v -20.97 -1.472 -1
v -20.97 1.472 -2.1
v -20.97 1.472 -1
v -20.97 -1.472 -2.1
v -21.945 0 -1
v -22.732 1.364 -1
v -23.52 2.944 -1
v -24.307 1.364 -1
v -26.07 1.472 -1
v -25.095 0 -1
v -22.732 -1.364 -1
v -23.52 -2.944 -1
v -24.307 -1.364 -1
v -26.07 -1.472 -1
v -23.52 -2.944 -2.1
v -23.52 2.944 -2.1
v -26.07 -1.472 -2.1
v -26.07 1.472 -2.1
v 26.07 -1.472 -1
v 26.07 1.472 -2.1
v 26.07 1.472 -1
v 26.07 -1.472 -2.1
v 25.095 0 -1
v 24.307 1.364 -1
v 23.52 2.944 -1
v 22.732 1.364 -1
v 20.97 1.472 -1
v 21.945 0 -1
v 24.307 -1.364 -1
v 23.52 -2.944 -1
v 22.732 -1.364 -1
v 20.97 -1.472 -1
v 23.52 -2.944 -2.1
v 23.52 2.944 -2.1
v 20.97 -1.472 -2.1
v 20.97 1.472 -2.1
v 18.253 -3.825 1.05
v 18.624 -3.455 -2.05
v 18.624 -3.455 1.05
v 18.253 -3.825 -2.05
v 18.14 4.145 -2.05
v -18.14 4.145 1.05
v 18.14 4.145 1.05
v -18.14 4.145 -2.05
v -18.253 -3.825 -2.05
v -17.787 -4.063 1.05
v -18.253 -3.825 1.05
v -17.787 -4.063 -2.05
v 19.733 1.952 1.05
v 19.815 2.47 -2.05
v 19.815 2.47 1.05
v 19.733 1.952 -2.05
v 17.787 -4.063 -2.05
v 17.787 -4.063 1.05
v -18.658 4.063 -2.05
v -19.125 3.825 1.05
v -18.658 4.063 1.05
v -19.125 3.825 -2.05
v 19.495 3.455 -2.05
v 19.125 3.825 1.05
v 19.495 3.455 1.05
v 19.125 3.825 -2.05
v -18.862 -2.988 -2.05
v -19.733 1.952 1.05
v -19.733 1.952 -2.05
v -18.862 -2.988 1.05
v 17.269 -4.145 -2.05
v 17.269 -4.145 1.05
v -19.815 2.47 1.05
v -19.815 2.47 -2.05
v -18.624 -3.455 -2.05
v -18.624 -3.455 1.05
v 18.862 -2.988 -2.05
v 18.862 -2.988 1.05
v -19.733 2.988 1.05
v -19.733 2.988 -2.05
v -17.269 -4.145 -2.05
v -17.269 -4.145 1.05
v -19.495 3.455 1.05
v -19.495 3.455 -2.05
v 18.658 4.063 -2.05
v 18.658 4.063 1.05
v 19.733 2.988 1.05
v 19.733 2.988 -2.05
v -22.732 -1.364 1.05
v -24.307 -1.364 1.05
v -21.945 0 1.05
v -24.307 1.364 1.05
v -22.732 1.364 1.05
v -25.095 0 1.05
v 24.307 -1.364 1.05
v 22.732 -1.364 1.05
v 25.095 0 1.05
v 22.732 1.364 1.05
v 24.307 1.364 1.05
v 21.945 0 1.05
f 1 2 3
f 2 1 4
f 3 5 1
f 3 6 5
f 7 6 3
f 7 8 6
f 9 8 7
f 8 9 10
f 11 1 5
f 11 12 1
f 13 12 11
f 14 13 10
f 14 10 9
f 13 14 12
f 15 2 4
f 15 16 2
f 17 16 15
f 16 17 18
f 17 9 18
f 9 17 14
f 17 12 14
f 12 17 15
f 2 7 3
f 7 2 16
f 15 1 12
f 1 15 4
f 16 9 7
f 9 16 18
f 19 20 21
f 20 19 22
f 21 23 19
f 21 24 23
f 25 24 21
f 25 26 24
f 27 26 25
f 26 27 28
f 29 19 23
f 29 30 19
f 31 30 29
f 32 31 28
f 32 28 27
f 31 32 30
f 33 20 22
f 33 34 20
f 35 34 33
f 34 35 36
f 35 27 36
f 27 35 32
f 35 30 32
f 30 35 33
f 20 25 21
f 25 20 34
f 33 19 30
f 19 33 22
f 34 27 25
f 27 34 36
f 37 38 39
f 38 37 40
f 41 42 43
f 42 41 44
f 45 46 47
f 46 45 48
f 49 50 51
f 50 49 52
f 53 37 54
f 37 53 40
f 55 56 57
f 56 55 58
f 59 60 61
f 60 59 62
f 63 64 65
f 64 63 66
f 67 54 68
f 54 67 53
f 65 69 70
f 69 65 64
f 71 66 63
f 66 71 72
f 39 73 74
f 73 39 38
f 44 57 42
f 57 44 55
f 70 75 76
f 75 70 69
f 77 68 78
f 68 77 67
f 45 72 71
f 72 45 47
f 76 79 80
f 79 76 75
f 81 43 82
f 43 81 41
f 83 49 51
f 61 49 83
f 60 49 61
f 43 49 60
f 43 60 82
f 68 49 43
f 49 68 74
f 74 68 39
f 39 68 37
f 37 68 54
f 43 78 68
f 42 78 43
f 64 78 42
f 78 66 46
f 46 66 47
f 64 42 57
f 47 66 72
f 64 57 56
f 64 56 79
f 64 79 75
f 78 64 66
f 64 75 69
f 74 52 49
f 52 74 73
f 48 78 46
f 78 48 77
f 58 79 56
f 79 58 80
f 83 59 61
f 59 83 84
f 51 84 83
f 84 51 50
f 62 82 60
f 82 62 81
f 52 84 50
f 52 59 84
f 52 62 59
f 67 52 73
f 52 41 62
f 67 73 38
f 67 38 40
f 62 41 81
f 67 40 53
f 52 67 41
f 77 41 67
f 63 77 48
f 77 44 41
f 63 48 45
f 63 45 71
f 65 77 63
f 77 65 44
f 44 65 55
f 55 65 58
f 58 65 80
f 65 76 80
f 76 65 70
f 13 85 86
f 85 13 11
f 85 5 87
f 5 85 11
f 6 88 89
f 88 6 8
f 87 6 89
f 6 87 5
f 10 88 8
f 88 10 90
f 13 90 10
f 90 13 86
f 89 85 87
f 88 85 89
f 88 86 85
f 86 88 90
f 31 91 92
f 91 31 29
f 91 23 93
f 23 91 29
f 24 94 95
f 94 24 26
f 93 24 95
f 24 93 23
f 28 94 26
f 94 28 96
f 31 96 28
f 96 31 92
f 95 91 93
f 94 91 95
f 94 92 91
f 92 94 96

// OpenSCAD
// file: ../../lib/nut/nut_hexagonal.scad
//nut_M(3,1,0.1);
//nut_M(6,1,0.1);
//nut_M_border(6,10,3,0.1);

module nut_M(size,height,clear)
{
    nut_hexagonal(size,height,clear);
}

module nut_M_border(size,radius,height,clear)
{
    difference() {
        //cylinder(r=radius, h=height,center=true);
        nut_hexagonal(radius,height,clear);
        nut_hexagonal(size,height,clear);
    }
}

module nut_hexagonal(radius,height,clear)
{
    height = height+clear;
	radius = radius+clear;
    angle = 360/6;
	cote = (radius)/tan(angle);

	union()
    {
		rotate([0,0,0])
			cube([radius,cote,height],center=true);
		rotate([0,0,angle])
			cube([radius,cote,height],center=true);
		rotate([0,0,2*angle])
			cube([radius,cote,height],center=true);
	}
}
// file: ../../lib/connector/connector_dsub.scad
/*
Inspired by D-Sub connector library by 'dpeart'
http://forums.reprap.org/read.php?313,577003
*/

include <../nut/nut_hexagonal.scad>;

//connector_dsub_9F(3,0.1);
//connector_dsub_9R(3,0.1);
//connector_dsub_15F(3,0.1);
//connector_dsub_15R(3,0.1);
//connector_dsub_25F(3,0.1);
//connector_dsub_25R(3,0.1);
//connector_dsub_37F(3,0.1);
//connector_dsub_37R(3,0.1);
//connector_dsub_50F(3,0.1);
//connector_dsub_50R(10,0.1);

module connector_dsub_9F(depth,clear)
{
    dimensions = [12.50,11.10,6.53,2.11];
    connector_dsub(dimensions,depth,clear);
}

module connector_dsub_9R(depth,clear)
{
    dimensions = [12.50,11.10,5.72,3.35];
    connector_dsub(dimensions,depth,clear);
}

module connector_dsub_15F(depth,clear)
{
    dimensions = [16.66,15.27,6.53,2.11];
    connector_dsub(dimensions,depth,clear);
}

module connector_dsub_15R(depth,clear)
{
    dimensions = [16.66,15.27,5.72,3.35];
    connector_dsub(dimensions,depth,clear);
}

module connector_dsub_25F(depth,clear)
{
    dimensions = [23.52,22.15,6.53,2.11];
    connector_dsub(dimensions,depth,clear);
}

module connector_dsub_25R(depth,clear)
{
    dimensions = [23.52,21.39,5.72,3.35];
    connector_dsub(dimensions,depth,clear);
}

module connector_dsub_37F(depth,clear)
{
    dimensions = [31.75,29.54,6.53,2.11];
    connector_dsub(dimensions,depth,clear);
}

module connector_dsub_37R(depth,clear)
{
    dimensions = [31.75,29.54,5.72,3.35];
    connector_dsub(dimensions,depth,clear);
}

module connector_dsub_50F(depth,clear)
{
    dimensions = [30.56,29.19,7.93,2.11];
    connector_dsub(dimensions,depth,clear);
}

module connector_dsub_50R(depth,clear)
{
    dimensions = [30.56,28.17,7.06,3.35];
    connector_dsub(dimensions,depth,clear);
}

module connector_dsub(dimensions,depth,clear)
{
    sides = 20;
    
    b = dimensions[0];
    d = dimensions[1];
    f = dimensions[2];
    k = dimensions[3];
    h = depth+clear;
    g = clear;

    cut_angle = 10;
    mounting_hole = 3.05;
    o = 2*(g+f-k)*tan(cut_angle);

    translate([0,0,-0.5])
    {
        union()
        {
            hull()
            {
                translate([-(g+d-k),(g+f-k),-h/2])
                    cylinder(h=h, d=k, $fn=sides);
                translate([(g+d-k),(g+f-k),-h/2])
                    cylinder(h=h, d=k, $fn=sides);
                translate([-(g+d-k)+o,-(g+f-k),-h/2])
                    cylinder(h=h, d=k, $fn=sides);
                translate([(g+d-k)-o,-(g+f-k),-h/2])
                    cylinder(h=h, d=k, $fn=sides);
            }

            translate([-b,0,-h/2])
                cylinder(h=h, d=g+mounting_hole, $fn=6);
            translate([-b,0,-h/2+0.5])
                nut_M(5,1,clear);
            translate([b,0,-h/2])
                cylinder(h=h, d=g+mounting_hole, $fn=6);
            translate([b,0,-h/2+0.5])
                nut_M(5,1,clear);
        }
    }
}
// main file
include <../../lib/connector/connector_dsub.scad>;

connector_dsub_25R(3,0.1);
